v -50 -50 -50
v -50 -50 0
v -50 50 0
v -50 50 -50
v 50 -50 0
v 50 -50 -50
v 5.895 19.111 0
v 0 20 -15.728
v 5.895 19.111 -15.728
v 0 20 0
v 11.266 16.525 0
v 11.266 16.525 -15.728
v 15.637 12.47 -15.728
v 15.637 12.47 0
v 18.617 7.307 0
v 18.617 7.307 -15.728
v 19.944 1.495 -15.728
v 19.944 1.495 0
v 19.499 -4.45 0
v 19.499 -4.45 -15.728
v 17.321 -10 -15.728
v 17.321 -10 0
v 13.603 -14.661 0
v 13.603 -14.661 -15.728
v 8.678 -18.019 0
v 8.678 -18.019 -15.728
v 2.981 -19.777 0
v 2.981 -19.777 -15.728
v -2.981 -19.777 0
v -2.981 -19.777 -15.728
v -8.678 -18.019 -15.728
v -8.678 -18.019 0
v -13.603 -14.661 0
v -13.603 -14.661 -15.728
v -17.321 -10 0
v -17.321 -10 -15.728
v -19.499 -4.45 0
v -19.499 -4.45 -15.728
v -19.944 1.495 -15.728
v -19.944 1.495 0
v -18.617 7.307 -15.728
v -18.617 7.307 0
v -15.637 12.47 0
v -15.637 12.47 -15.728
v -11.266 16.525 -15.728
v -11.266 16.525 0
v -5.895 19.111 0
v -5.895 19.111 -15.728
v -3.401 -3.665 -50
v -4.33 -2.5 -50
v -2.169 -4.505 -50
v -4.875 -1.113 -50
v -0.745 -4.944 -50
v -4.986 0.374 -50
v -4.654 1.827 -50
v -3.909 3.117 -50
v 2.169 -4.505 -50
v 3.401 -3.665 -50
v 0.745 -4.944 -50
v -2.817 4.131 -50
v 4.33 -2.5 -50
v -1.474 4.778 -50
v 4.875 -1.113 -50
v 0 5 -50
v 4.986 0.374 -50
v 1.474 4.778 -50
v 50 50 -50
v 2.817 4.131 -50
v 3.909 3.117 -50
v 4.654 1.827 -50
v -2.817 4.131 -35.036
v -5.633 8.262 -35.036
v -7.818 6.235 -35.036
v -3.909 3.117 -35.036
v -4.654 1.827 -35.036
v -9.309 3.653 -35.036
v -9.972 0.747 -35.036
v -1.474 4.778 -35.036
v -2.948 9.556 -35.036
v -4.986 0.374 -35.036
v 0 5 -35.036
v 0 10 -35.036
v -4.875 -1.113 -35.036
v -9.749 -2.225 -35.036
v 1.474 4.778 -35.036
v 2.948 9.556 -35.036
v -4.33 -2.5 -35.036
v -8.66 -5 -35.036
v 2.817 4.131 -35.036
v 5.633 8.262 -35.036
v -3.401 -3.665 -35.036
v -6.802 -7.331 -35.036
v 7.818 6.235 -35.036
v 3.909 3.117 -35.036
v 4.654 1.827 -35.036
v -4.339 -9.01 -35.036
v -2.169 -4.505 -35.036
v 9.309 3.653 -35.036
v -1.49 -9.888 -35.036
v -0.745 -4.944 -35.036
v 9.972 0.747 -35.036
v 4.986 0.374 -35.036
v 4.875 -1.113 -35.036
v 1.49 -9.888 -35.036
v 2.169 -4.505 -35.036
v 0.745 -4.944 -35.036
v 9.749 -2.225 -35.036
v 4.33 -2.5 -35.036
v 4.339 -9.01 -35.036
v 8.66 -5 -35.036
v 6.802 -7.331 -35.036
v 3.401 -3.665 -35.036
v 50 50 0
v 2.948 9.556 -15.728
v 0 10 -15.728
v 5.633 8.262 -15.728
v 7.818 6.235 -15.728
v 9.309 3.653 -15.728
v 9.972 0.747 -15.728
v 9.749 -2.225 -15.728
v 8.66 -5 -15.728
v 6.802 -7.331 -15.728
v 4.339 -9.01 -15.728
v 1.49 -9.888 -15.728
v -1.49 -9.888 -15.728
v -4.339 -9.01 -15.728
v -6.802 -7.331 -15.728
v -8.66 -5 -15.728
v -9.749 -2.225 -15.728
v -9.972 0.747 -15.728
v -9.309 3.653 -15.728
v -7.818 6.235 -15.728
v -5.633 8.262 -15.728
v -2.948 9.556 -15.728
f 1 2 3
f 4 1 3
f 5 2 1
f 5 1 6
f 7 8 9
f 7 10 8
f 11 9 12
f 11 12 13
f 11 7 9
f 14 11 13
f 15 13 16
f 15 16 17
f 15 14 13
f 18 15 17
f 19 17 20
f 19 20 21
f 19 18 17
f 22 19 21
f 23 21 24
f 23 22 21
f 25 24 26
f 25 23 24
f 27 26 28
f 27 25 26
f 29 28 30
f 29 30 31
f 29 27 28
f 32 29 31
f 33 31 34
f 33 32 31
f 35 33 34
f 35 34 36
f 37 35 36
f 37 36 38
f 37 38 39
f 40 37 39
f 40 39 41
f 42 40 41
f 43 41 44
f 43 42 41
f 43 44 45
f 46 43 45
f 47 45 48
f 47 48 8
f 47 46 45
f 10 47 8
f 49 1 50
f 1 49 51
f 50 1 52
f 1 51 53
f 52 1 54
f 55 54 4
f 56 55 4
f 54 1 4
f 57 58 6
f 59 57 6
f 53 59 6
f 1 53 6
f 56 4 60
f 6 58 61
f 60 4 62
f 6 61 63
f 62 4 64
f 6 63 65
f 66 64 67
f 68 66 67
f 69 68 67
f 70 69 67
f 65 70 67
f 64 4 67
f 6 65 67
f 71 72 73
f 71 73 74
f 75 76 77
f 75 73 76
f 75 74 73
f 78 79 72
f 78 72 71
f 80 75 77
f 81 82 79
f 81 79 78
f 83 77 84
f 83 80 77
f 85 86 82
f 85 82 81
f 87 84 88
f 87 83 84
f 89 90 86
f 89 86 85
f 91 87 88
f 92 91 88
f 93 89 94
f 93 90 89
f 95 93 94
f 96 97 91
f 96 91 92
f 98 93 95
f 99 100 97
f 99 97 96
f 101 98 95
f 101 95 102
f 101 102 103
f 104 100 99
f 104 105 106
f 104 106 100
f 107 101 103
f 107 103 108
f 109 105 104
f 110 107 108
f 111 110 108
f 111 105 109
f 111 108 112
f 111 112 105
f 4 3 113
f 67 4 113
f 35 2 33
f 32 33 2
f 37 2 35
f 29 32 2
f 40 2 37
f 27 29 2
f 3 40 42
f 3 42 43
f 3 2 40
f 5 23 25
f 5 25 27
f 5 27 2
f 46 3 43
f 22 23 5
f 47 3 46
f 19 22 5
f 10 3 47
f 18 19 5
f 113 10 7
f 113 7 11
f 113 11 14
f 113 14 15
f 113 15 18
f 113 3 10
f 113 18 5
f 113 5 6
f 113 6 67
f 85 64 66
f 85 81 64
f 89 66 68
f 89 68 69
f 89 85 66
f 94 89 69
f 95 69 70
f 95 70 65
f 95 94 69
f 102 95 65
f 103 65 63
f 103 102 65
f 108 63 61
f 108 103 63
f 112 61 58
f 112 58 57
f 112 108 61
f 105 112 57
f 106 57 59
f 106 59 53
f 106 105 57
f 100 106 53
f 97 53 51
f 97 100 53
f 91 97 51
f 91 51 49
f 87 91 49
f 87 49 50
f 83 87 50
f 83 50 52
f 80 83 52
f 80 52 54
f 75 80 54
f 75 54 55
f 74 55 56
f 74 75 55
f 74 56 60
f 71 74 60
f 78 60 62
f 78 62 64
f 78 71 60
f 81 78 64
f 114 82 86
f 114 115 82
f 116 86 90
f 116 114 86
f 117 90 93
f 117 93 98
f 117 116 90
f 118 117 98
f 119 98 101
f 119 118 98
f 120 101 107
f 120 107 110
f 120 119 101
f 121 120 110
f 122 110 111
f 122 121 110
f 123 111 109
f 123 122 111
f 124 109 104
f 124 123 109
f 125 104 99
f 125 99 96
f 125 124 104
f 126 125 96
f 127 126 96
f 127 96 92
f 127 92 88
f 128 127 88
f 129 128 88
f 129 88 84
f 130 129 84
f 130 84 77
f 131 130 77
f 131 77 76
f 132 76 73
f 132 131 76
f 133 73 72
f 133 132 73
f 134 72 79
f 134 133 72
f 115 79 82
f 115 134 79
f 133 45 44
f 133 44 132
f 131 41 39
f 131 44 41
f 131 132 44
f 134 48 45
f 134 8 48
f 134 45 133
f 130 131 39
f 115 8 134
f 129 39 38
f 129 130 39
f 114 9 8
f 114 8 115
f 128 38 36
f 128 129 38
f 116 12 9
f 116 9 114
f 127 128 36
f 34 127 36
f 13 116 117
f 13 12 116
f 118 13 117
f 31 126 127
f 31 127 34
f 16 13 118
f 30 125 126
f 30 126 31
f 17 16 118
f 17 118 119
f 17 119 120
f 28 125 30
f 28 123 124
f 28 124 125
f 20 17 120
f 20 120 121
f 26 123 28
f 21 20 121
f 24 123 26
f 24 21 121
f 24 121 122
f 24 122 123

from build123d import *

# Parameters (mm, degrees)
F0_W     = 100
F0_H     = 100
F1_DEPTH = 50


with BuildPart() as f1:
    # F0 (on Top) → F1 (new body)
    with BuildSketch(Plane.XY):
        Rectangle(F0_W, F0_H)
    extrude(amount=-F1_DEPTH)

    # F2 (on Right) → F3 (revolve, cut)
    with BuildSketch(Plane.YZ):
        Polygon((20, 0), (0, 0), (0, -50), (5, -50), (5, -35.036158), (10, -35.036158), (10, -15.728306), (20, -15.728306), align=None)
    revolve(axis=Axis((0, 0, 12.636881), (0, 0, -1)), mode=Mode.SUBTRACT)


solid = f1.part
